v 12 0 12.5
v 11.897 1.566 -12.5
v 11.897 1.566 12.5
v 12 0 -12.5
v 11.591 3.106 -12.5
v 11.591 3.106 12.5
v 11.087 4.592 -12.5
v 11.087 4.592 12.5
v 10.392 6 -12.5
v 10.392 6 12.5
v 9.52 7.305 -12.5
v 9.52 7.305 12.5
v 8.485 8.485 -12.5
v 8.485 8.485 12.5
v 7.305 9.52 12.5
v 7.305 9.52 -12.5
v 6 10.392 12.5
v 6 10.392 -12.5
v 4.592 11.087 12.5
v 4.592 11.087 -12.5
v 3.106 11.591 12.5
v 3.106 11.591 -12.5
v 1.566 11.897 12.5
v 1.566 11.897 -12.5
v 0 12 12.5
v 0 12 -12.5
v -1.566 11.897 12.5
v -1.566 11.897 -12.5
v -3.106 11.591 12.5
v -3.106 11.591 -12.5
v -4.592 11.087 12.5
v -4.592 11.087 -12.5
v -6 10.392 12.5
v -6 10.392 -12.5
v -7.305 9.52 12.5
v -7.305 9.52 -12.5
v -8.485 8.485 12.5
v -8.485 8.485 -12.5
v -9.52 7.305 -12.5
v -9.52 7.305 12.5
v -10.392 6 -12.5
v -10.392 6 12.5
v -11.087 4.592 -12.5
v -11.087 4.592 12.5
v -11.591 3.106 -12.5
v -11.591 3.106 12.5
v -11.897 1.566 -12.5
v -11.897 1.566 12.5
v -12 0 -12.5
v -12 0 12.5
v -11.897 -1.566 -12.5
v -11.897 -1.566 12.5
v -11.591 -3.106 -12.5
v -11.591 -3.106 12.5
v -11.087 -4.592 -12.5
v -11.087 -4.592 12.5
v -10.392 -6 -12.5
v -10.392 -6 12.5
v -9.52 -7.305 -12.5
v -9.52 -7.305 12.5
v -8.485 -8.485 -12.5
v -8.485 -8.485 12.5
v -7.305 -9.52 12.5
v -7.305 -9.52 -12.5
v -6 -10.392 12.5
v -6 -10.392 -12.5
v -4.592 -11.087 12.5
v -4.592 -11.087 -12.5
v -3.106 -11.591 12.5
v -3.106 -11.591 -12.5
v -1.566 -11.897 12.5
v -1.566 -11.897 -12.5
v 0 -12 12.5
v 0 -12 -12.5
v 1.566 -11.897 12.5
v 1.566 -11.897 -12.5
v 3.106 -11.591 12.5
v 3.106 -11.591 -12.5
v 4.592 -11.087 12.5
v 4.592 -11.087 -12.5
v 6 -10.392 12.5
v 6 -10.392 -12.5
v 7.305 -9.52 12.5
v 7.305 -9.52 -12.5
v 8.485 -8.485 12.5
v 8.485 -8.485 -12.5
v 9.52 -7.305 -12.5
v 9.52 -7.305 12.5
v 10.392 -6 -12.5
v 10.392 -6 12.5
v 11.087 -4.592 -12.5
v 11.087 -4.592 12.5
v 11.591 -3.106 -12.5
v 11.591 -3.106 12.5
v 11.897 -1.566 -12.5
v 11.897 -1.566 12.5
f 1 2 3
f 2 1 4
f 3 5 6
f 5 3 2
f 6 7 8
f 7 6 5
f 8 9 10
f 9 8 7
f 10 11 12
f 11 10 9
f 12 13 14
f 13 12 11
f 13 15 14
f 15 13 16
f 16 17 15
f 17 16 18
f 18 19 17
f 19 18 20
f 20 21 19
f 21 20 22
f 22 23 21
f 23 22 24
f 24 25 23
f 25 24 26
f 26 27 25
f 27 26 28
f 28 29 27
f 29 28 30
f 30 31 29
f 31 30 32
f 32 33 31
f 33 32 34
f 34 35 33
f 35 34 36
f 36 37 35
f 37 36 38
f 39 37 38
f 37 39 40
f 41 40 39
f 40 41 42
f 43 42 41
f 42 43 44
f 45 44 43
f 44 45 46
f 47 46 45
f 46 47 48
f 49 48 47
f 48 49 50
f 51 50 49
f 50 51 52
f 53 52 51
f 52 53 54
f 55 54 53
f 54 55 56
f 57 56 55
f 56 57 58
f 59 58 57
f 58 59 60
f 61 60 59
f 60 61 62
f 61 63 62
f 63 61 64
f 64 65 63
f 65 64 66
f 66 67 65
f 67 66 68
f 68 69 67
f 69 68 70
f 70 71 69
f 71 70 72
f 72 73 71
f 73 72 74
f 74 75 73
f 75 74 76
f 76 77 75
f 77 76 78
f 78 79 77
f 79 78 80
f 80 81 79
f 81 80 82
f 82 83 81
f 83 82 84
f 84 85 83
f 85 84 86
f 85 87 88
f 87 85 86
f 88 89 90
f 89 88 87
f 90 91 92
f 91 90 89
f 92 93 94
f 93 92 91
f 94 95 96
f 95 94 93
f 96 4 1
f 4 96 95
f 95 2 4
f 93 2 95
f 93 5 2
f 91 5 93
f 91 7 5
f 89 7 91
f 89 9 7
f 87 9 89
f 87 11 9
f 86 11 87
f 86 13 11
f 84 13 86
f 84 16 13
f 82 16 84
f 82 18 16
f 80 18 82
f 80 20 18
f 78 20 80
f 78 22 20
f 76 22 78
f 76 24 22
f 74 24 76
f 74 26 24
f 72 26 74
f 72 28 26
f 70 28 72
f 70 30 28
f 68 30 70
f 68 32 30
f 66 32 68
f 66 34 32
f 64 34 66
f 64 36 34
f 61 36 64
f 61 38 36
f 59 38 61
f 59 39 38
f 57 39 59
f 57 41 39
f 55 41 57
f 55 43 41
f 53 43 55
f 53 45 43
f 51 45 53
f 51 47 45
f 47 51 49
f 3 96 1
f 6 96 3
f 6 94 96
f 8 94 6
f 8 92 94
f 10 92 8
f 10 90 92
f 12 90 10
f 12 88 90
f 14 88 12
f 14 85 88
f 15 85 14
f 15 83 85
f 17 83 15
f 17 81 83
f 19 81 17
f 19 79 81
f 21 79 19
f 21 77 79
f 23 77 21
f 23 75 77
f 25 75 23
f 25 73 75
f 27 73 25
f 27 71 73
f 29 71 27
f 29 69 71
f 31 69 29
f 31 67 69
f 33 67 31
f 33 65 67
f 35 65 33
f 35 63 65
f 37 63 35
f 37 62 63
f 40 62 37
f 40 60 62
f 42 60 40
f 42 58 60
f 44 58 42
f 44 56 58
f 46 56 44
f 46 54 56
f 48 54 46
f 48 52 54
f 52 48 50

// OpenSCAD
// ========================================
// a cylinder with radius 12 mm and height 25 mm
// NeuroCAD canonical IR; dimensions are millimetres
// ========================================
$fn = 48;

cylinder(r=12, h=25, center=true);
